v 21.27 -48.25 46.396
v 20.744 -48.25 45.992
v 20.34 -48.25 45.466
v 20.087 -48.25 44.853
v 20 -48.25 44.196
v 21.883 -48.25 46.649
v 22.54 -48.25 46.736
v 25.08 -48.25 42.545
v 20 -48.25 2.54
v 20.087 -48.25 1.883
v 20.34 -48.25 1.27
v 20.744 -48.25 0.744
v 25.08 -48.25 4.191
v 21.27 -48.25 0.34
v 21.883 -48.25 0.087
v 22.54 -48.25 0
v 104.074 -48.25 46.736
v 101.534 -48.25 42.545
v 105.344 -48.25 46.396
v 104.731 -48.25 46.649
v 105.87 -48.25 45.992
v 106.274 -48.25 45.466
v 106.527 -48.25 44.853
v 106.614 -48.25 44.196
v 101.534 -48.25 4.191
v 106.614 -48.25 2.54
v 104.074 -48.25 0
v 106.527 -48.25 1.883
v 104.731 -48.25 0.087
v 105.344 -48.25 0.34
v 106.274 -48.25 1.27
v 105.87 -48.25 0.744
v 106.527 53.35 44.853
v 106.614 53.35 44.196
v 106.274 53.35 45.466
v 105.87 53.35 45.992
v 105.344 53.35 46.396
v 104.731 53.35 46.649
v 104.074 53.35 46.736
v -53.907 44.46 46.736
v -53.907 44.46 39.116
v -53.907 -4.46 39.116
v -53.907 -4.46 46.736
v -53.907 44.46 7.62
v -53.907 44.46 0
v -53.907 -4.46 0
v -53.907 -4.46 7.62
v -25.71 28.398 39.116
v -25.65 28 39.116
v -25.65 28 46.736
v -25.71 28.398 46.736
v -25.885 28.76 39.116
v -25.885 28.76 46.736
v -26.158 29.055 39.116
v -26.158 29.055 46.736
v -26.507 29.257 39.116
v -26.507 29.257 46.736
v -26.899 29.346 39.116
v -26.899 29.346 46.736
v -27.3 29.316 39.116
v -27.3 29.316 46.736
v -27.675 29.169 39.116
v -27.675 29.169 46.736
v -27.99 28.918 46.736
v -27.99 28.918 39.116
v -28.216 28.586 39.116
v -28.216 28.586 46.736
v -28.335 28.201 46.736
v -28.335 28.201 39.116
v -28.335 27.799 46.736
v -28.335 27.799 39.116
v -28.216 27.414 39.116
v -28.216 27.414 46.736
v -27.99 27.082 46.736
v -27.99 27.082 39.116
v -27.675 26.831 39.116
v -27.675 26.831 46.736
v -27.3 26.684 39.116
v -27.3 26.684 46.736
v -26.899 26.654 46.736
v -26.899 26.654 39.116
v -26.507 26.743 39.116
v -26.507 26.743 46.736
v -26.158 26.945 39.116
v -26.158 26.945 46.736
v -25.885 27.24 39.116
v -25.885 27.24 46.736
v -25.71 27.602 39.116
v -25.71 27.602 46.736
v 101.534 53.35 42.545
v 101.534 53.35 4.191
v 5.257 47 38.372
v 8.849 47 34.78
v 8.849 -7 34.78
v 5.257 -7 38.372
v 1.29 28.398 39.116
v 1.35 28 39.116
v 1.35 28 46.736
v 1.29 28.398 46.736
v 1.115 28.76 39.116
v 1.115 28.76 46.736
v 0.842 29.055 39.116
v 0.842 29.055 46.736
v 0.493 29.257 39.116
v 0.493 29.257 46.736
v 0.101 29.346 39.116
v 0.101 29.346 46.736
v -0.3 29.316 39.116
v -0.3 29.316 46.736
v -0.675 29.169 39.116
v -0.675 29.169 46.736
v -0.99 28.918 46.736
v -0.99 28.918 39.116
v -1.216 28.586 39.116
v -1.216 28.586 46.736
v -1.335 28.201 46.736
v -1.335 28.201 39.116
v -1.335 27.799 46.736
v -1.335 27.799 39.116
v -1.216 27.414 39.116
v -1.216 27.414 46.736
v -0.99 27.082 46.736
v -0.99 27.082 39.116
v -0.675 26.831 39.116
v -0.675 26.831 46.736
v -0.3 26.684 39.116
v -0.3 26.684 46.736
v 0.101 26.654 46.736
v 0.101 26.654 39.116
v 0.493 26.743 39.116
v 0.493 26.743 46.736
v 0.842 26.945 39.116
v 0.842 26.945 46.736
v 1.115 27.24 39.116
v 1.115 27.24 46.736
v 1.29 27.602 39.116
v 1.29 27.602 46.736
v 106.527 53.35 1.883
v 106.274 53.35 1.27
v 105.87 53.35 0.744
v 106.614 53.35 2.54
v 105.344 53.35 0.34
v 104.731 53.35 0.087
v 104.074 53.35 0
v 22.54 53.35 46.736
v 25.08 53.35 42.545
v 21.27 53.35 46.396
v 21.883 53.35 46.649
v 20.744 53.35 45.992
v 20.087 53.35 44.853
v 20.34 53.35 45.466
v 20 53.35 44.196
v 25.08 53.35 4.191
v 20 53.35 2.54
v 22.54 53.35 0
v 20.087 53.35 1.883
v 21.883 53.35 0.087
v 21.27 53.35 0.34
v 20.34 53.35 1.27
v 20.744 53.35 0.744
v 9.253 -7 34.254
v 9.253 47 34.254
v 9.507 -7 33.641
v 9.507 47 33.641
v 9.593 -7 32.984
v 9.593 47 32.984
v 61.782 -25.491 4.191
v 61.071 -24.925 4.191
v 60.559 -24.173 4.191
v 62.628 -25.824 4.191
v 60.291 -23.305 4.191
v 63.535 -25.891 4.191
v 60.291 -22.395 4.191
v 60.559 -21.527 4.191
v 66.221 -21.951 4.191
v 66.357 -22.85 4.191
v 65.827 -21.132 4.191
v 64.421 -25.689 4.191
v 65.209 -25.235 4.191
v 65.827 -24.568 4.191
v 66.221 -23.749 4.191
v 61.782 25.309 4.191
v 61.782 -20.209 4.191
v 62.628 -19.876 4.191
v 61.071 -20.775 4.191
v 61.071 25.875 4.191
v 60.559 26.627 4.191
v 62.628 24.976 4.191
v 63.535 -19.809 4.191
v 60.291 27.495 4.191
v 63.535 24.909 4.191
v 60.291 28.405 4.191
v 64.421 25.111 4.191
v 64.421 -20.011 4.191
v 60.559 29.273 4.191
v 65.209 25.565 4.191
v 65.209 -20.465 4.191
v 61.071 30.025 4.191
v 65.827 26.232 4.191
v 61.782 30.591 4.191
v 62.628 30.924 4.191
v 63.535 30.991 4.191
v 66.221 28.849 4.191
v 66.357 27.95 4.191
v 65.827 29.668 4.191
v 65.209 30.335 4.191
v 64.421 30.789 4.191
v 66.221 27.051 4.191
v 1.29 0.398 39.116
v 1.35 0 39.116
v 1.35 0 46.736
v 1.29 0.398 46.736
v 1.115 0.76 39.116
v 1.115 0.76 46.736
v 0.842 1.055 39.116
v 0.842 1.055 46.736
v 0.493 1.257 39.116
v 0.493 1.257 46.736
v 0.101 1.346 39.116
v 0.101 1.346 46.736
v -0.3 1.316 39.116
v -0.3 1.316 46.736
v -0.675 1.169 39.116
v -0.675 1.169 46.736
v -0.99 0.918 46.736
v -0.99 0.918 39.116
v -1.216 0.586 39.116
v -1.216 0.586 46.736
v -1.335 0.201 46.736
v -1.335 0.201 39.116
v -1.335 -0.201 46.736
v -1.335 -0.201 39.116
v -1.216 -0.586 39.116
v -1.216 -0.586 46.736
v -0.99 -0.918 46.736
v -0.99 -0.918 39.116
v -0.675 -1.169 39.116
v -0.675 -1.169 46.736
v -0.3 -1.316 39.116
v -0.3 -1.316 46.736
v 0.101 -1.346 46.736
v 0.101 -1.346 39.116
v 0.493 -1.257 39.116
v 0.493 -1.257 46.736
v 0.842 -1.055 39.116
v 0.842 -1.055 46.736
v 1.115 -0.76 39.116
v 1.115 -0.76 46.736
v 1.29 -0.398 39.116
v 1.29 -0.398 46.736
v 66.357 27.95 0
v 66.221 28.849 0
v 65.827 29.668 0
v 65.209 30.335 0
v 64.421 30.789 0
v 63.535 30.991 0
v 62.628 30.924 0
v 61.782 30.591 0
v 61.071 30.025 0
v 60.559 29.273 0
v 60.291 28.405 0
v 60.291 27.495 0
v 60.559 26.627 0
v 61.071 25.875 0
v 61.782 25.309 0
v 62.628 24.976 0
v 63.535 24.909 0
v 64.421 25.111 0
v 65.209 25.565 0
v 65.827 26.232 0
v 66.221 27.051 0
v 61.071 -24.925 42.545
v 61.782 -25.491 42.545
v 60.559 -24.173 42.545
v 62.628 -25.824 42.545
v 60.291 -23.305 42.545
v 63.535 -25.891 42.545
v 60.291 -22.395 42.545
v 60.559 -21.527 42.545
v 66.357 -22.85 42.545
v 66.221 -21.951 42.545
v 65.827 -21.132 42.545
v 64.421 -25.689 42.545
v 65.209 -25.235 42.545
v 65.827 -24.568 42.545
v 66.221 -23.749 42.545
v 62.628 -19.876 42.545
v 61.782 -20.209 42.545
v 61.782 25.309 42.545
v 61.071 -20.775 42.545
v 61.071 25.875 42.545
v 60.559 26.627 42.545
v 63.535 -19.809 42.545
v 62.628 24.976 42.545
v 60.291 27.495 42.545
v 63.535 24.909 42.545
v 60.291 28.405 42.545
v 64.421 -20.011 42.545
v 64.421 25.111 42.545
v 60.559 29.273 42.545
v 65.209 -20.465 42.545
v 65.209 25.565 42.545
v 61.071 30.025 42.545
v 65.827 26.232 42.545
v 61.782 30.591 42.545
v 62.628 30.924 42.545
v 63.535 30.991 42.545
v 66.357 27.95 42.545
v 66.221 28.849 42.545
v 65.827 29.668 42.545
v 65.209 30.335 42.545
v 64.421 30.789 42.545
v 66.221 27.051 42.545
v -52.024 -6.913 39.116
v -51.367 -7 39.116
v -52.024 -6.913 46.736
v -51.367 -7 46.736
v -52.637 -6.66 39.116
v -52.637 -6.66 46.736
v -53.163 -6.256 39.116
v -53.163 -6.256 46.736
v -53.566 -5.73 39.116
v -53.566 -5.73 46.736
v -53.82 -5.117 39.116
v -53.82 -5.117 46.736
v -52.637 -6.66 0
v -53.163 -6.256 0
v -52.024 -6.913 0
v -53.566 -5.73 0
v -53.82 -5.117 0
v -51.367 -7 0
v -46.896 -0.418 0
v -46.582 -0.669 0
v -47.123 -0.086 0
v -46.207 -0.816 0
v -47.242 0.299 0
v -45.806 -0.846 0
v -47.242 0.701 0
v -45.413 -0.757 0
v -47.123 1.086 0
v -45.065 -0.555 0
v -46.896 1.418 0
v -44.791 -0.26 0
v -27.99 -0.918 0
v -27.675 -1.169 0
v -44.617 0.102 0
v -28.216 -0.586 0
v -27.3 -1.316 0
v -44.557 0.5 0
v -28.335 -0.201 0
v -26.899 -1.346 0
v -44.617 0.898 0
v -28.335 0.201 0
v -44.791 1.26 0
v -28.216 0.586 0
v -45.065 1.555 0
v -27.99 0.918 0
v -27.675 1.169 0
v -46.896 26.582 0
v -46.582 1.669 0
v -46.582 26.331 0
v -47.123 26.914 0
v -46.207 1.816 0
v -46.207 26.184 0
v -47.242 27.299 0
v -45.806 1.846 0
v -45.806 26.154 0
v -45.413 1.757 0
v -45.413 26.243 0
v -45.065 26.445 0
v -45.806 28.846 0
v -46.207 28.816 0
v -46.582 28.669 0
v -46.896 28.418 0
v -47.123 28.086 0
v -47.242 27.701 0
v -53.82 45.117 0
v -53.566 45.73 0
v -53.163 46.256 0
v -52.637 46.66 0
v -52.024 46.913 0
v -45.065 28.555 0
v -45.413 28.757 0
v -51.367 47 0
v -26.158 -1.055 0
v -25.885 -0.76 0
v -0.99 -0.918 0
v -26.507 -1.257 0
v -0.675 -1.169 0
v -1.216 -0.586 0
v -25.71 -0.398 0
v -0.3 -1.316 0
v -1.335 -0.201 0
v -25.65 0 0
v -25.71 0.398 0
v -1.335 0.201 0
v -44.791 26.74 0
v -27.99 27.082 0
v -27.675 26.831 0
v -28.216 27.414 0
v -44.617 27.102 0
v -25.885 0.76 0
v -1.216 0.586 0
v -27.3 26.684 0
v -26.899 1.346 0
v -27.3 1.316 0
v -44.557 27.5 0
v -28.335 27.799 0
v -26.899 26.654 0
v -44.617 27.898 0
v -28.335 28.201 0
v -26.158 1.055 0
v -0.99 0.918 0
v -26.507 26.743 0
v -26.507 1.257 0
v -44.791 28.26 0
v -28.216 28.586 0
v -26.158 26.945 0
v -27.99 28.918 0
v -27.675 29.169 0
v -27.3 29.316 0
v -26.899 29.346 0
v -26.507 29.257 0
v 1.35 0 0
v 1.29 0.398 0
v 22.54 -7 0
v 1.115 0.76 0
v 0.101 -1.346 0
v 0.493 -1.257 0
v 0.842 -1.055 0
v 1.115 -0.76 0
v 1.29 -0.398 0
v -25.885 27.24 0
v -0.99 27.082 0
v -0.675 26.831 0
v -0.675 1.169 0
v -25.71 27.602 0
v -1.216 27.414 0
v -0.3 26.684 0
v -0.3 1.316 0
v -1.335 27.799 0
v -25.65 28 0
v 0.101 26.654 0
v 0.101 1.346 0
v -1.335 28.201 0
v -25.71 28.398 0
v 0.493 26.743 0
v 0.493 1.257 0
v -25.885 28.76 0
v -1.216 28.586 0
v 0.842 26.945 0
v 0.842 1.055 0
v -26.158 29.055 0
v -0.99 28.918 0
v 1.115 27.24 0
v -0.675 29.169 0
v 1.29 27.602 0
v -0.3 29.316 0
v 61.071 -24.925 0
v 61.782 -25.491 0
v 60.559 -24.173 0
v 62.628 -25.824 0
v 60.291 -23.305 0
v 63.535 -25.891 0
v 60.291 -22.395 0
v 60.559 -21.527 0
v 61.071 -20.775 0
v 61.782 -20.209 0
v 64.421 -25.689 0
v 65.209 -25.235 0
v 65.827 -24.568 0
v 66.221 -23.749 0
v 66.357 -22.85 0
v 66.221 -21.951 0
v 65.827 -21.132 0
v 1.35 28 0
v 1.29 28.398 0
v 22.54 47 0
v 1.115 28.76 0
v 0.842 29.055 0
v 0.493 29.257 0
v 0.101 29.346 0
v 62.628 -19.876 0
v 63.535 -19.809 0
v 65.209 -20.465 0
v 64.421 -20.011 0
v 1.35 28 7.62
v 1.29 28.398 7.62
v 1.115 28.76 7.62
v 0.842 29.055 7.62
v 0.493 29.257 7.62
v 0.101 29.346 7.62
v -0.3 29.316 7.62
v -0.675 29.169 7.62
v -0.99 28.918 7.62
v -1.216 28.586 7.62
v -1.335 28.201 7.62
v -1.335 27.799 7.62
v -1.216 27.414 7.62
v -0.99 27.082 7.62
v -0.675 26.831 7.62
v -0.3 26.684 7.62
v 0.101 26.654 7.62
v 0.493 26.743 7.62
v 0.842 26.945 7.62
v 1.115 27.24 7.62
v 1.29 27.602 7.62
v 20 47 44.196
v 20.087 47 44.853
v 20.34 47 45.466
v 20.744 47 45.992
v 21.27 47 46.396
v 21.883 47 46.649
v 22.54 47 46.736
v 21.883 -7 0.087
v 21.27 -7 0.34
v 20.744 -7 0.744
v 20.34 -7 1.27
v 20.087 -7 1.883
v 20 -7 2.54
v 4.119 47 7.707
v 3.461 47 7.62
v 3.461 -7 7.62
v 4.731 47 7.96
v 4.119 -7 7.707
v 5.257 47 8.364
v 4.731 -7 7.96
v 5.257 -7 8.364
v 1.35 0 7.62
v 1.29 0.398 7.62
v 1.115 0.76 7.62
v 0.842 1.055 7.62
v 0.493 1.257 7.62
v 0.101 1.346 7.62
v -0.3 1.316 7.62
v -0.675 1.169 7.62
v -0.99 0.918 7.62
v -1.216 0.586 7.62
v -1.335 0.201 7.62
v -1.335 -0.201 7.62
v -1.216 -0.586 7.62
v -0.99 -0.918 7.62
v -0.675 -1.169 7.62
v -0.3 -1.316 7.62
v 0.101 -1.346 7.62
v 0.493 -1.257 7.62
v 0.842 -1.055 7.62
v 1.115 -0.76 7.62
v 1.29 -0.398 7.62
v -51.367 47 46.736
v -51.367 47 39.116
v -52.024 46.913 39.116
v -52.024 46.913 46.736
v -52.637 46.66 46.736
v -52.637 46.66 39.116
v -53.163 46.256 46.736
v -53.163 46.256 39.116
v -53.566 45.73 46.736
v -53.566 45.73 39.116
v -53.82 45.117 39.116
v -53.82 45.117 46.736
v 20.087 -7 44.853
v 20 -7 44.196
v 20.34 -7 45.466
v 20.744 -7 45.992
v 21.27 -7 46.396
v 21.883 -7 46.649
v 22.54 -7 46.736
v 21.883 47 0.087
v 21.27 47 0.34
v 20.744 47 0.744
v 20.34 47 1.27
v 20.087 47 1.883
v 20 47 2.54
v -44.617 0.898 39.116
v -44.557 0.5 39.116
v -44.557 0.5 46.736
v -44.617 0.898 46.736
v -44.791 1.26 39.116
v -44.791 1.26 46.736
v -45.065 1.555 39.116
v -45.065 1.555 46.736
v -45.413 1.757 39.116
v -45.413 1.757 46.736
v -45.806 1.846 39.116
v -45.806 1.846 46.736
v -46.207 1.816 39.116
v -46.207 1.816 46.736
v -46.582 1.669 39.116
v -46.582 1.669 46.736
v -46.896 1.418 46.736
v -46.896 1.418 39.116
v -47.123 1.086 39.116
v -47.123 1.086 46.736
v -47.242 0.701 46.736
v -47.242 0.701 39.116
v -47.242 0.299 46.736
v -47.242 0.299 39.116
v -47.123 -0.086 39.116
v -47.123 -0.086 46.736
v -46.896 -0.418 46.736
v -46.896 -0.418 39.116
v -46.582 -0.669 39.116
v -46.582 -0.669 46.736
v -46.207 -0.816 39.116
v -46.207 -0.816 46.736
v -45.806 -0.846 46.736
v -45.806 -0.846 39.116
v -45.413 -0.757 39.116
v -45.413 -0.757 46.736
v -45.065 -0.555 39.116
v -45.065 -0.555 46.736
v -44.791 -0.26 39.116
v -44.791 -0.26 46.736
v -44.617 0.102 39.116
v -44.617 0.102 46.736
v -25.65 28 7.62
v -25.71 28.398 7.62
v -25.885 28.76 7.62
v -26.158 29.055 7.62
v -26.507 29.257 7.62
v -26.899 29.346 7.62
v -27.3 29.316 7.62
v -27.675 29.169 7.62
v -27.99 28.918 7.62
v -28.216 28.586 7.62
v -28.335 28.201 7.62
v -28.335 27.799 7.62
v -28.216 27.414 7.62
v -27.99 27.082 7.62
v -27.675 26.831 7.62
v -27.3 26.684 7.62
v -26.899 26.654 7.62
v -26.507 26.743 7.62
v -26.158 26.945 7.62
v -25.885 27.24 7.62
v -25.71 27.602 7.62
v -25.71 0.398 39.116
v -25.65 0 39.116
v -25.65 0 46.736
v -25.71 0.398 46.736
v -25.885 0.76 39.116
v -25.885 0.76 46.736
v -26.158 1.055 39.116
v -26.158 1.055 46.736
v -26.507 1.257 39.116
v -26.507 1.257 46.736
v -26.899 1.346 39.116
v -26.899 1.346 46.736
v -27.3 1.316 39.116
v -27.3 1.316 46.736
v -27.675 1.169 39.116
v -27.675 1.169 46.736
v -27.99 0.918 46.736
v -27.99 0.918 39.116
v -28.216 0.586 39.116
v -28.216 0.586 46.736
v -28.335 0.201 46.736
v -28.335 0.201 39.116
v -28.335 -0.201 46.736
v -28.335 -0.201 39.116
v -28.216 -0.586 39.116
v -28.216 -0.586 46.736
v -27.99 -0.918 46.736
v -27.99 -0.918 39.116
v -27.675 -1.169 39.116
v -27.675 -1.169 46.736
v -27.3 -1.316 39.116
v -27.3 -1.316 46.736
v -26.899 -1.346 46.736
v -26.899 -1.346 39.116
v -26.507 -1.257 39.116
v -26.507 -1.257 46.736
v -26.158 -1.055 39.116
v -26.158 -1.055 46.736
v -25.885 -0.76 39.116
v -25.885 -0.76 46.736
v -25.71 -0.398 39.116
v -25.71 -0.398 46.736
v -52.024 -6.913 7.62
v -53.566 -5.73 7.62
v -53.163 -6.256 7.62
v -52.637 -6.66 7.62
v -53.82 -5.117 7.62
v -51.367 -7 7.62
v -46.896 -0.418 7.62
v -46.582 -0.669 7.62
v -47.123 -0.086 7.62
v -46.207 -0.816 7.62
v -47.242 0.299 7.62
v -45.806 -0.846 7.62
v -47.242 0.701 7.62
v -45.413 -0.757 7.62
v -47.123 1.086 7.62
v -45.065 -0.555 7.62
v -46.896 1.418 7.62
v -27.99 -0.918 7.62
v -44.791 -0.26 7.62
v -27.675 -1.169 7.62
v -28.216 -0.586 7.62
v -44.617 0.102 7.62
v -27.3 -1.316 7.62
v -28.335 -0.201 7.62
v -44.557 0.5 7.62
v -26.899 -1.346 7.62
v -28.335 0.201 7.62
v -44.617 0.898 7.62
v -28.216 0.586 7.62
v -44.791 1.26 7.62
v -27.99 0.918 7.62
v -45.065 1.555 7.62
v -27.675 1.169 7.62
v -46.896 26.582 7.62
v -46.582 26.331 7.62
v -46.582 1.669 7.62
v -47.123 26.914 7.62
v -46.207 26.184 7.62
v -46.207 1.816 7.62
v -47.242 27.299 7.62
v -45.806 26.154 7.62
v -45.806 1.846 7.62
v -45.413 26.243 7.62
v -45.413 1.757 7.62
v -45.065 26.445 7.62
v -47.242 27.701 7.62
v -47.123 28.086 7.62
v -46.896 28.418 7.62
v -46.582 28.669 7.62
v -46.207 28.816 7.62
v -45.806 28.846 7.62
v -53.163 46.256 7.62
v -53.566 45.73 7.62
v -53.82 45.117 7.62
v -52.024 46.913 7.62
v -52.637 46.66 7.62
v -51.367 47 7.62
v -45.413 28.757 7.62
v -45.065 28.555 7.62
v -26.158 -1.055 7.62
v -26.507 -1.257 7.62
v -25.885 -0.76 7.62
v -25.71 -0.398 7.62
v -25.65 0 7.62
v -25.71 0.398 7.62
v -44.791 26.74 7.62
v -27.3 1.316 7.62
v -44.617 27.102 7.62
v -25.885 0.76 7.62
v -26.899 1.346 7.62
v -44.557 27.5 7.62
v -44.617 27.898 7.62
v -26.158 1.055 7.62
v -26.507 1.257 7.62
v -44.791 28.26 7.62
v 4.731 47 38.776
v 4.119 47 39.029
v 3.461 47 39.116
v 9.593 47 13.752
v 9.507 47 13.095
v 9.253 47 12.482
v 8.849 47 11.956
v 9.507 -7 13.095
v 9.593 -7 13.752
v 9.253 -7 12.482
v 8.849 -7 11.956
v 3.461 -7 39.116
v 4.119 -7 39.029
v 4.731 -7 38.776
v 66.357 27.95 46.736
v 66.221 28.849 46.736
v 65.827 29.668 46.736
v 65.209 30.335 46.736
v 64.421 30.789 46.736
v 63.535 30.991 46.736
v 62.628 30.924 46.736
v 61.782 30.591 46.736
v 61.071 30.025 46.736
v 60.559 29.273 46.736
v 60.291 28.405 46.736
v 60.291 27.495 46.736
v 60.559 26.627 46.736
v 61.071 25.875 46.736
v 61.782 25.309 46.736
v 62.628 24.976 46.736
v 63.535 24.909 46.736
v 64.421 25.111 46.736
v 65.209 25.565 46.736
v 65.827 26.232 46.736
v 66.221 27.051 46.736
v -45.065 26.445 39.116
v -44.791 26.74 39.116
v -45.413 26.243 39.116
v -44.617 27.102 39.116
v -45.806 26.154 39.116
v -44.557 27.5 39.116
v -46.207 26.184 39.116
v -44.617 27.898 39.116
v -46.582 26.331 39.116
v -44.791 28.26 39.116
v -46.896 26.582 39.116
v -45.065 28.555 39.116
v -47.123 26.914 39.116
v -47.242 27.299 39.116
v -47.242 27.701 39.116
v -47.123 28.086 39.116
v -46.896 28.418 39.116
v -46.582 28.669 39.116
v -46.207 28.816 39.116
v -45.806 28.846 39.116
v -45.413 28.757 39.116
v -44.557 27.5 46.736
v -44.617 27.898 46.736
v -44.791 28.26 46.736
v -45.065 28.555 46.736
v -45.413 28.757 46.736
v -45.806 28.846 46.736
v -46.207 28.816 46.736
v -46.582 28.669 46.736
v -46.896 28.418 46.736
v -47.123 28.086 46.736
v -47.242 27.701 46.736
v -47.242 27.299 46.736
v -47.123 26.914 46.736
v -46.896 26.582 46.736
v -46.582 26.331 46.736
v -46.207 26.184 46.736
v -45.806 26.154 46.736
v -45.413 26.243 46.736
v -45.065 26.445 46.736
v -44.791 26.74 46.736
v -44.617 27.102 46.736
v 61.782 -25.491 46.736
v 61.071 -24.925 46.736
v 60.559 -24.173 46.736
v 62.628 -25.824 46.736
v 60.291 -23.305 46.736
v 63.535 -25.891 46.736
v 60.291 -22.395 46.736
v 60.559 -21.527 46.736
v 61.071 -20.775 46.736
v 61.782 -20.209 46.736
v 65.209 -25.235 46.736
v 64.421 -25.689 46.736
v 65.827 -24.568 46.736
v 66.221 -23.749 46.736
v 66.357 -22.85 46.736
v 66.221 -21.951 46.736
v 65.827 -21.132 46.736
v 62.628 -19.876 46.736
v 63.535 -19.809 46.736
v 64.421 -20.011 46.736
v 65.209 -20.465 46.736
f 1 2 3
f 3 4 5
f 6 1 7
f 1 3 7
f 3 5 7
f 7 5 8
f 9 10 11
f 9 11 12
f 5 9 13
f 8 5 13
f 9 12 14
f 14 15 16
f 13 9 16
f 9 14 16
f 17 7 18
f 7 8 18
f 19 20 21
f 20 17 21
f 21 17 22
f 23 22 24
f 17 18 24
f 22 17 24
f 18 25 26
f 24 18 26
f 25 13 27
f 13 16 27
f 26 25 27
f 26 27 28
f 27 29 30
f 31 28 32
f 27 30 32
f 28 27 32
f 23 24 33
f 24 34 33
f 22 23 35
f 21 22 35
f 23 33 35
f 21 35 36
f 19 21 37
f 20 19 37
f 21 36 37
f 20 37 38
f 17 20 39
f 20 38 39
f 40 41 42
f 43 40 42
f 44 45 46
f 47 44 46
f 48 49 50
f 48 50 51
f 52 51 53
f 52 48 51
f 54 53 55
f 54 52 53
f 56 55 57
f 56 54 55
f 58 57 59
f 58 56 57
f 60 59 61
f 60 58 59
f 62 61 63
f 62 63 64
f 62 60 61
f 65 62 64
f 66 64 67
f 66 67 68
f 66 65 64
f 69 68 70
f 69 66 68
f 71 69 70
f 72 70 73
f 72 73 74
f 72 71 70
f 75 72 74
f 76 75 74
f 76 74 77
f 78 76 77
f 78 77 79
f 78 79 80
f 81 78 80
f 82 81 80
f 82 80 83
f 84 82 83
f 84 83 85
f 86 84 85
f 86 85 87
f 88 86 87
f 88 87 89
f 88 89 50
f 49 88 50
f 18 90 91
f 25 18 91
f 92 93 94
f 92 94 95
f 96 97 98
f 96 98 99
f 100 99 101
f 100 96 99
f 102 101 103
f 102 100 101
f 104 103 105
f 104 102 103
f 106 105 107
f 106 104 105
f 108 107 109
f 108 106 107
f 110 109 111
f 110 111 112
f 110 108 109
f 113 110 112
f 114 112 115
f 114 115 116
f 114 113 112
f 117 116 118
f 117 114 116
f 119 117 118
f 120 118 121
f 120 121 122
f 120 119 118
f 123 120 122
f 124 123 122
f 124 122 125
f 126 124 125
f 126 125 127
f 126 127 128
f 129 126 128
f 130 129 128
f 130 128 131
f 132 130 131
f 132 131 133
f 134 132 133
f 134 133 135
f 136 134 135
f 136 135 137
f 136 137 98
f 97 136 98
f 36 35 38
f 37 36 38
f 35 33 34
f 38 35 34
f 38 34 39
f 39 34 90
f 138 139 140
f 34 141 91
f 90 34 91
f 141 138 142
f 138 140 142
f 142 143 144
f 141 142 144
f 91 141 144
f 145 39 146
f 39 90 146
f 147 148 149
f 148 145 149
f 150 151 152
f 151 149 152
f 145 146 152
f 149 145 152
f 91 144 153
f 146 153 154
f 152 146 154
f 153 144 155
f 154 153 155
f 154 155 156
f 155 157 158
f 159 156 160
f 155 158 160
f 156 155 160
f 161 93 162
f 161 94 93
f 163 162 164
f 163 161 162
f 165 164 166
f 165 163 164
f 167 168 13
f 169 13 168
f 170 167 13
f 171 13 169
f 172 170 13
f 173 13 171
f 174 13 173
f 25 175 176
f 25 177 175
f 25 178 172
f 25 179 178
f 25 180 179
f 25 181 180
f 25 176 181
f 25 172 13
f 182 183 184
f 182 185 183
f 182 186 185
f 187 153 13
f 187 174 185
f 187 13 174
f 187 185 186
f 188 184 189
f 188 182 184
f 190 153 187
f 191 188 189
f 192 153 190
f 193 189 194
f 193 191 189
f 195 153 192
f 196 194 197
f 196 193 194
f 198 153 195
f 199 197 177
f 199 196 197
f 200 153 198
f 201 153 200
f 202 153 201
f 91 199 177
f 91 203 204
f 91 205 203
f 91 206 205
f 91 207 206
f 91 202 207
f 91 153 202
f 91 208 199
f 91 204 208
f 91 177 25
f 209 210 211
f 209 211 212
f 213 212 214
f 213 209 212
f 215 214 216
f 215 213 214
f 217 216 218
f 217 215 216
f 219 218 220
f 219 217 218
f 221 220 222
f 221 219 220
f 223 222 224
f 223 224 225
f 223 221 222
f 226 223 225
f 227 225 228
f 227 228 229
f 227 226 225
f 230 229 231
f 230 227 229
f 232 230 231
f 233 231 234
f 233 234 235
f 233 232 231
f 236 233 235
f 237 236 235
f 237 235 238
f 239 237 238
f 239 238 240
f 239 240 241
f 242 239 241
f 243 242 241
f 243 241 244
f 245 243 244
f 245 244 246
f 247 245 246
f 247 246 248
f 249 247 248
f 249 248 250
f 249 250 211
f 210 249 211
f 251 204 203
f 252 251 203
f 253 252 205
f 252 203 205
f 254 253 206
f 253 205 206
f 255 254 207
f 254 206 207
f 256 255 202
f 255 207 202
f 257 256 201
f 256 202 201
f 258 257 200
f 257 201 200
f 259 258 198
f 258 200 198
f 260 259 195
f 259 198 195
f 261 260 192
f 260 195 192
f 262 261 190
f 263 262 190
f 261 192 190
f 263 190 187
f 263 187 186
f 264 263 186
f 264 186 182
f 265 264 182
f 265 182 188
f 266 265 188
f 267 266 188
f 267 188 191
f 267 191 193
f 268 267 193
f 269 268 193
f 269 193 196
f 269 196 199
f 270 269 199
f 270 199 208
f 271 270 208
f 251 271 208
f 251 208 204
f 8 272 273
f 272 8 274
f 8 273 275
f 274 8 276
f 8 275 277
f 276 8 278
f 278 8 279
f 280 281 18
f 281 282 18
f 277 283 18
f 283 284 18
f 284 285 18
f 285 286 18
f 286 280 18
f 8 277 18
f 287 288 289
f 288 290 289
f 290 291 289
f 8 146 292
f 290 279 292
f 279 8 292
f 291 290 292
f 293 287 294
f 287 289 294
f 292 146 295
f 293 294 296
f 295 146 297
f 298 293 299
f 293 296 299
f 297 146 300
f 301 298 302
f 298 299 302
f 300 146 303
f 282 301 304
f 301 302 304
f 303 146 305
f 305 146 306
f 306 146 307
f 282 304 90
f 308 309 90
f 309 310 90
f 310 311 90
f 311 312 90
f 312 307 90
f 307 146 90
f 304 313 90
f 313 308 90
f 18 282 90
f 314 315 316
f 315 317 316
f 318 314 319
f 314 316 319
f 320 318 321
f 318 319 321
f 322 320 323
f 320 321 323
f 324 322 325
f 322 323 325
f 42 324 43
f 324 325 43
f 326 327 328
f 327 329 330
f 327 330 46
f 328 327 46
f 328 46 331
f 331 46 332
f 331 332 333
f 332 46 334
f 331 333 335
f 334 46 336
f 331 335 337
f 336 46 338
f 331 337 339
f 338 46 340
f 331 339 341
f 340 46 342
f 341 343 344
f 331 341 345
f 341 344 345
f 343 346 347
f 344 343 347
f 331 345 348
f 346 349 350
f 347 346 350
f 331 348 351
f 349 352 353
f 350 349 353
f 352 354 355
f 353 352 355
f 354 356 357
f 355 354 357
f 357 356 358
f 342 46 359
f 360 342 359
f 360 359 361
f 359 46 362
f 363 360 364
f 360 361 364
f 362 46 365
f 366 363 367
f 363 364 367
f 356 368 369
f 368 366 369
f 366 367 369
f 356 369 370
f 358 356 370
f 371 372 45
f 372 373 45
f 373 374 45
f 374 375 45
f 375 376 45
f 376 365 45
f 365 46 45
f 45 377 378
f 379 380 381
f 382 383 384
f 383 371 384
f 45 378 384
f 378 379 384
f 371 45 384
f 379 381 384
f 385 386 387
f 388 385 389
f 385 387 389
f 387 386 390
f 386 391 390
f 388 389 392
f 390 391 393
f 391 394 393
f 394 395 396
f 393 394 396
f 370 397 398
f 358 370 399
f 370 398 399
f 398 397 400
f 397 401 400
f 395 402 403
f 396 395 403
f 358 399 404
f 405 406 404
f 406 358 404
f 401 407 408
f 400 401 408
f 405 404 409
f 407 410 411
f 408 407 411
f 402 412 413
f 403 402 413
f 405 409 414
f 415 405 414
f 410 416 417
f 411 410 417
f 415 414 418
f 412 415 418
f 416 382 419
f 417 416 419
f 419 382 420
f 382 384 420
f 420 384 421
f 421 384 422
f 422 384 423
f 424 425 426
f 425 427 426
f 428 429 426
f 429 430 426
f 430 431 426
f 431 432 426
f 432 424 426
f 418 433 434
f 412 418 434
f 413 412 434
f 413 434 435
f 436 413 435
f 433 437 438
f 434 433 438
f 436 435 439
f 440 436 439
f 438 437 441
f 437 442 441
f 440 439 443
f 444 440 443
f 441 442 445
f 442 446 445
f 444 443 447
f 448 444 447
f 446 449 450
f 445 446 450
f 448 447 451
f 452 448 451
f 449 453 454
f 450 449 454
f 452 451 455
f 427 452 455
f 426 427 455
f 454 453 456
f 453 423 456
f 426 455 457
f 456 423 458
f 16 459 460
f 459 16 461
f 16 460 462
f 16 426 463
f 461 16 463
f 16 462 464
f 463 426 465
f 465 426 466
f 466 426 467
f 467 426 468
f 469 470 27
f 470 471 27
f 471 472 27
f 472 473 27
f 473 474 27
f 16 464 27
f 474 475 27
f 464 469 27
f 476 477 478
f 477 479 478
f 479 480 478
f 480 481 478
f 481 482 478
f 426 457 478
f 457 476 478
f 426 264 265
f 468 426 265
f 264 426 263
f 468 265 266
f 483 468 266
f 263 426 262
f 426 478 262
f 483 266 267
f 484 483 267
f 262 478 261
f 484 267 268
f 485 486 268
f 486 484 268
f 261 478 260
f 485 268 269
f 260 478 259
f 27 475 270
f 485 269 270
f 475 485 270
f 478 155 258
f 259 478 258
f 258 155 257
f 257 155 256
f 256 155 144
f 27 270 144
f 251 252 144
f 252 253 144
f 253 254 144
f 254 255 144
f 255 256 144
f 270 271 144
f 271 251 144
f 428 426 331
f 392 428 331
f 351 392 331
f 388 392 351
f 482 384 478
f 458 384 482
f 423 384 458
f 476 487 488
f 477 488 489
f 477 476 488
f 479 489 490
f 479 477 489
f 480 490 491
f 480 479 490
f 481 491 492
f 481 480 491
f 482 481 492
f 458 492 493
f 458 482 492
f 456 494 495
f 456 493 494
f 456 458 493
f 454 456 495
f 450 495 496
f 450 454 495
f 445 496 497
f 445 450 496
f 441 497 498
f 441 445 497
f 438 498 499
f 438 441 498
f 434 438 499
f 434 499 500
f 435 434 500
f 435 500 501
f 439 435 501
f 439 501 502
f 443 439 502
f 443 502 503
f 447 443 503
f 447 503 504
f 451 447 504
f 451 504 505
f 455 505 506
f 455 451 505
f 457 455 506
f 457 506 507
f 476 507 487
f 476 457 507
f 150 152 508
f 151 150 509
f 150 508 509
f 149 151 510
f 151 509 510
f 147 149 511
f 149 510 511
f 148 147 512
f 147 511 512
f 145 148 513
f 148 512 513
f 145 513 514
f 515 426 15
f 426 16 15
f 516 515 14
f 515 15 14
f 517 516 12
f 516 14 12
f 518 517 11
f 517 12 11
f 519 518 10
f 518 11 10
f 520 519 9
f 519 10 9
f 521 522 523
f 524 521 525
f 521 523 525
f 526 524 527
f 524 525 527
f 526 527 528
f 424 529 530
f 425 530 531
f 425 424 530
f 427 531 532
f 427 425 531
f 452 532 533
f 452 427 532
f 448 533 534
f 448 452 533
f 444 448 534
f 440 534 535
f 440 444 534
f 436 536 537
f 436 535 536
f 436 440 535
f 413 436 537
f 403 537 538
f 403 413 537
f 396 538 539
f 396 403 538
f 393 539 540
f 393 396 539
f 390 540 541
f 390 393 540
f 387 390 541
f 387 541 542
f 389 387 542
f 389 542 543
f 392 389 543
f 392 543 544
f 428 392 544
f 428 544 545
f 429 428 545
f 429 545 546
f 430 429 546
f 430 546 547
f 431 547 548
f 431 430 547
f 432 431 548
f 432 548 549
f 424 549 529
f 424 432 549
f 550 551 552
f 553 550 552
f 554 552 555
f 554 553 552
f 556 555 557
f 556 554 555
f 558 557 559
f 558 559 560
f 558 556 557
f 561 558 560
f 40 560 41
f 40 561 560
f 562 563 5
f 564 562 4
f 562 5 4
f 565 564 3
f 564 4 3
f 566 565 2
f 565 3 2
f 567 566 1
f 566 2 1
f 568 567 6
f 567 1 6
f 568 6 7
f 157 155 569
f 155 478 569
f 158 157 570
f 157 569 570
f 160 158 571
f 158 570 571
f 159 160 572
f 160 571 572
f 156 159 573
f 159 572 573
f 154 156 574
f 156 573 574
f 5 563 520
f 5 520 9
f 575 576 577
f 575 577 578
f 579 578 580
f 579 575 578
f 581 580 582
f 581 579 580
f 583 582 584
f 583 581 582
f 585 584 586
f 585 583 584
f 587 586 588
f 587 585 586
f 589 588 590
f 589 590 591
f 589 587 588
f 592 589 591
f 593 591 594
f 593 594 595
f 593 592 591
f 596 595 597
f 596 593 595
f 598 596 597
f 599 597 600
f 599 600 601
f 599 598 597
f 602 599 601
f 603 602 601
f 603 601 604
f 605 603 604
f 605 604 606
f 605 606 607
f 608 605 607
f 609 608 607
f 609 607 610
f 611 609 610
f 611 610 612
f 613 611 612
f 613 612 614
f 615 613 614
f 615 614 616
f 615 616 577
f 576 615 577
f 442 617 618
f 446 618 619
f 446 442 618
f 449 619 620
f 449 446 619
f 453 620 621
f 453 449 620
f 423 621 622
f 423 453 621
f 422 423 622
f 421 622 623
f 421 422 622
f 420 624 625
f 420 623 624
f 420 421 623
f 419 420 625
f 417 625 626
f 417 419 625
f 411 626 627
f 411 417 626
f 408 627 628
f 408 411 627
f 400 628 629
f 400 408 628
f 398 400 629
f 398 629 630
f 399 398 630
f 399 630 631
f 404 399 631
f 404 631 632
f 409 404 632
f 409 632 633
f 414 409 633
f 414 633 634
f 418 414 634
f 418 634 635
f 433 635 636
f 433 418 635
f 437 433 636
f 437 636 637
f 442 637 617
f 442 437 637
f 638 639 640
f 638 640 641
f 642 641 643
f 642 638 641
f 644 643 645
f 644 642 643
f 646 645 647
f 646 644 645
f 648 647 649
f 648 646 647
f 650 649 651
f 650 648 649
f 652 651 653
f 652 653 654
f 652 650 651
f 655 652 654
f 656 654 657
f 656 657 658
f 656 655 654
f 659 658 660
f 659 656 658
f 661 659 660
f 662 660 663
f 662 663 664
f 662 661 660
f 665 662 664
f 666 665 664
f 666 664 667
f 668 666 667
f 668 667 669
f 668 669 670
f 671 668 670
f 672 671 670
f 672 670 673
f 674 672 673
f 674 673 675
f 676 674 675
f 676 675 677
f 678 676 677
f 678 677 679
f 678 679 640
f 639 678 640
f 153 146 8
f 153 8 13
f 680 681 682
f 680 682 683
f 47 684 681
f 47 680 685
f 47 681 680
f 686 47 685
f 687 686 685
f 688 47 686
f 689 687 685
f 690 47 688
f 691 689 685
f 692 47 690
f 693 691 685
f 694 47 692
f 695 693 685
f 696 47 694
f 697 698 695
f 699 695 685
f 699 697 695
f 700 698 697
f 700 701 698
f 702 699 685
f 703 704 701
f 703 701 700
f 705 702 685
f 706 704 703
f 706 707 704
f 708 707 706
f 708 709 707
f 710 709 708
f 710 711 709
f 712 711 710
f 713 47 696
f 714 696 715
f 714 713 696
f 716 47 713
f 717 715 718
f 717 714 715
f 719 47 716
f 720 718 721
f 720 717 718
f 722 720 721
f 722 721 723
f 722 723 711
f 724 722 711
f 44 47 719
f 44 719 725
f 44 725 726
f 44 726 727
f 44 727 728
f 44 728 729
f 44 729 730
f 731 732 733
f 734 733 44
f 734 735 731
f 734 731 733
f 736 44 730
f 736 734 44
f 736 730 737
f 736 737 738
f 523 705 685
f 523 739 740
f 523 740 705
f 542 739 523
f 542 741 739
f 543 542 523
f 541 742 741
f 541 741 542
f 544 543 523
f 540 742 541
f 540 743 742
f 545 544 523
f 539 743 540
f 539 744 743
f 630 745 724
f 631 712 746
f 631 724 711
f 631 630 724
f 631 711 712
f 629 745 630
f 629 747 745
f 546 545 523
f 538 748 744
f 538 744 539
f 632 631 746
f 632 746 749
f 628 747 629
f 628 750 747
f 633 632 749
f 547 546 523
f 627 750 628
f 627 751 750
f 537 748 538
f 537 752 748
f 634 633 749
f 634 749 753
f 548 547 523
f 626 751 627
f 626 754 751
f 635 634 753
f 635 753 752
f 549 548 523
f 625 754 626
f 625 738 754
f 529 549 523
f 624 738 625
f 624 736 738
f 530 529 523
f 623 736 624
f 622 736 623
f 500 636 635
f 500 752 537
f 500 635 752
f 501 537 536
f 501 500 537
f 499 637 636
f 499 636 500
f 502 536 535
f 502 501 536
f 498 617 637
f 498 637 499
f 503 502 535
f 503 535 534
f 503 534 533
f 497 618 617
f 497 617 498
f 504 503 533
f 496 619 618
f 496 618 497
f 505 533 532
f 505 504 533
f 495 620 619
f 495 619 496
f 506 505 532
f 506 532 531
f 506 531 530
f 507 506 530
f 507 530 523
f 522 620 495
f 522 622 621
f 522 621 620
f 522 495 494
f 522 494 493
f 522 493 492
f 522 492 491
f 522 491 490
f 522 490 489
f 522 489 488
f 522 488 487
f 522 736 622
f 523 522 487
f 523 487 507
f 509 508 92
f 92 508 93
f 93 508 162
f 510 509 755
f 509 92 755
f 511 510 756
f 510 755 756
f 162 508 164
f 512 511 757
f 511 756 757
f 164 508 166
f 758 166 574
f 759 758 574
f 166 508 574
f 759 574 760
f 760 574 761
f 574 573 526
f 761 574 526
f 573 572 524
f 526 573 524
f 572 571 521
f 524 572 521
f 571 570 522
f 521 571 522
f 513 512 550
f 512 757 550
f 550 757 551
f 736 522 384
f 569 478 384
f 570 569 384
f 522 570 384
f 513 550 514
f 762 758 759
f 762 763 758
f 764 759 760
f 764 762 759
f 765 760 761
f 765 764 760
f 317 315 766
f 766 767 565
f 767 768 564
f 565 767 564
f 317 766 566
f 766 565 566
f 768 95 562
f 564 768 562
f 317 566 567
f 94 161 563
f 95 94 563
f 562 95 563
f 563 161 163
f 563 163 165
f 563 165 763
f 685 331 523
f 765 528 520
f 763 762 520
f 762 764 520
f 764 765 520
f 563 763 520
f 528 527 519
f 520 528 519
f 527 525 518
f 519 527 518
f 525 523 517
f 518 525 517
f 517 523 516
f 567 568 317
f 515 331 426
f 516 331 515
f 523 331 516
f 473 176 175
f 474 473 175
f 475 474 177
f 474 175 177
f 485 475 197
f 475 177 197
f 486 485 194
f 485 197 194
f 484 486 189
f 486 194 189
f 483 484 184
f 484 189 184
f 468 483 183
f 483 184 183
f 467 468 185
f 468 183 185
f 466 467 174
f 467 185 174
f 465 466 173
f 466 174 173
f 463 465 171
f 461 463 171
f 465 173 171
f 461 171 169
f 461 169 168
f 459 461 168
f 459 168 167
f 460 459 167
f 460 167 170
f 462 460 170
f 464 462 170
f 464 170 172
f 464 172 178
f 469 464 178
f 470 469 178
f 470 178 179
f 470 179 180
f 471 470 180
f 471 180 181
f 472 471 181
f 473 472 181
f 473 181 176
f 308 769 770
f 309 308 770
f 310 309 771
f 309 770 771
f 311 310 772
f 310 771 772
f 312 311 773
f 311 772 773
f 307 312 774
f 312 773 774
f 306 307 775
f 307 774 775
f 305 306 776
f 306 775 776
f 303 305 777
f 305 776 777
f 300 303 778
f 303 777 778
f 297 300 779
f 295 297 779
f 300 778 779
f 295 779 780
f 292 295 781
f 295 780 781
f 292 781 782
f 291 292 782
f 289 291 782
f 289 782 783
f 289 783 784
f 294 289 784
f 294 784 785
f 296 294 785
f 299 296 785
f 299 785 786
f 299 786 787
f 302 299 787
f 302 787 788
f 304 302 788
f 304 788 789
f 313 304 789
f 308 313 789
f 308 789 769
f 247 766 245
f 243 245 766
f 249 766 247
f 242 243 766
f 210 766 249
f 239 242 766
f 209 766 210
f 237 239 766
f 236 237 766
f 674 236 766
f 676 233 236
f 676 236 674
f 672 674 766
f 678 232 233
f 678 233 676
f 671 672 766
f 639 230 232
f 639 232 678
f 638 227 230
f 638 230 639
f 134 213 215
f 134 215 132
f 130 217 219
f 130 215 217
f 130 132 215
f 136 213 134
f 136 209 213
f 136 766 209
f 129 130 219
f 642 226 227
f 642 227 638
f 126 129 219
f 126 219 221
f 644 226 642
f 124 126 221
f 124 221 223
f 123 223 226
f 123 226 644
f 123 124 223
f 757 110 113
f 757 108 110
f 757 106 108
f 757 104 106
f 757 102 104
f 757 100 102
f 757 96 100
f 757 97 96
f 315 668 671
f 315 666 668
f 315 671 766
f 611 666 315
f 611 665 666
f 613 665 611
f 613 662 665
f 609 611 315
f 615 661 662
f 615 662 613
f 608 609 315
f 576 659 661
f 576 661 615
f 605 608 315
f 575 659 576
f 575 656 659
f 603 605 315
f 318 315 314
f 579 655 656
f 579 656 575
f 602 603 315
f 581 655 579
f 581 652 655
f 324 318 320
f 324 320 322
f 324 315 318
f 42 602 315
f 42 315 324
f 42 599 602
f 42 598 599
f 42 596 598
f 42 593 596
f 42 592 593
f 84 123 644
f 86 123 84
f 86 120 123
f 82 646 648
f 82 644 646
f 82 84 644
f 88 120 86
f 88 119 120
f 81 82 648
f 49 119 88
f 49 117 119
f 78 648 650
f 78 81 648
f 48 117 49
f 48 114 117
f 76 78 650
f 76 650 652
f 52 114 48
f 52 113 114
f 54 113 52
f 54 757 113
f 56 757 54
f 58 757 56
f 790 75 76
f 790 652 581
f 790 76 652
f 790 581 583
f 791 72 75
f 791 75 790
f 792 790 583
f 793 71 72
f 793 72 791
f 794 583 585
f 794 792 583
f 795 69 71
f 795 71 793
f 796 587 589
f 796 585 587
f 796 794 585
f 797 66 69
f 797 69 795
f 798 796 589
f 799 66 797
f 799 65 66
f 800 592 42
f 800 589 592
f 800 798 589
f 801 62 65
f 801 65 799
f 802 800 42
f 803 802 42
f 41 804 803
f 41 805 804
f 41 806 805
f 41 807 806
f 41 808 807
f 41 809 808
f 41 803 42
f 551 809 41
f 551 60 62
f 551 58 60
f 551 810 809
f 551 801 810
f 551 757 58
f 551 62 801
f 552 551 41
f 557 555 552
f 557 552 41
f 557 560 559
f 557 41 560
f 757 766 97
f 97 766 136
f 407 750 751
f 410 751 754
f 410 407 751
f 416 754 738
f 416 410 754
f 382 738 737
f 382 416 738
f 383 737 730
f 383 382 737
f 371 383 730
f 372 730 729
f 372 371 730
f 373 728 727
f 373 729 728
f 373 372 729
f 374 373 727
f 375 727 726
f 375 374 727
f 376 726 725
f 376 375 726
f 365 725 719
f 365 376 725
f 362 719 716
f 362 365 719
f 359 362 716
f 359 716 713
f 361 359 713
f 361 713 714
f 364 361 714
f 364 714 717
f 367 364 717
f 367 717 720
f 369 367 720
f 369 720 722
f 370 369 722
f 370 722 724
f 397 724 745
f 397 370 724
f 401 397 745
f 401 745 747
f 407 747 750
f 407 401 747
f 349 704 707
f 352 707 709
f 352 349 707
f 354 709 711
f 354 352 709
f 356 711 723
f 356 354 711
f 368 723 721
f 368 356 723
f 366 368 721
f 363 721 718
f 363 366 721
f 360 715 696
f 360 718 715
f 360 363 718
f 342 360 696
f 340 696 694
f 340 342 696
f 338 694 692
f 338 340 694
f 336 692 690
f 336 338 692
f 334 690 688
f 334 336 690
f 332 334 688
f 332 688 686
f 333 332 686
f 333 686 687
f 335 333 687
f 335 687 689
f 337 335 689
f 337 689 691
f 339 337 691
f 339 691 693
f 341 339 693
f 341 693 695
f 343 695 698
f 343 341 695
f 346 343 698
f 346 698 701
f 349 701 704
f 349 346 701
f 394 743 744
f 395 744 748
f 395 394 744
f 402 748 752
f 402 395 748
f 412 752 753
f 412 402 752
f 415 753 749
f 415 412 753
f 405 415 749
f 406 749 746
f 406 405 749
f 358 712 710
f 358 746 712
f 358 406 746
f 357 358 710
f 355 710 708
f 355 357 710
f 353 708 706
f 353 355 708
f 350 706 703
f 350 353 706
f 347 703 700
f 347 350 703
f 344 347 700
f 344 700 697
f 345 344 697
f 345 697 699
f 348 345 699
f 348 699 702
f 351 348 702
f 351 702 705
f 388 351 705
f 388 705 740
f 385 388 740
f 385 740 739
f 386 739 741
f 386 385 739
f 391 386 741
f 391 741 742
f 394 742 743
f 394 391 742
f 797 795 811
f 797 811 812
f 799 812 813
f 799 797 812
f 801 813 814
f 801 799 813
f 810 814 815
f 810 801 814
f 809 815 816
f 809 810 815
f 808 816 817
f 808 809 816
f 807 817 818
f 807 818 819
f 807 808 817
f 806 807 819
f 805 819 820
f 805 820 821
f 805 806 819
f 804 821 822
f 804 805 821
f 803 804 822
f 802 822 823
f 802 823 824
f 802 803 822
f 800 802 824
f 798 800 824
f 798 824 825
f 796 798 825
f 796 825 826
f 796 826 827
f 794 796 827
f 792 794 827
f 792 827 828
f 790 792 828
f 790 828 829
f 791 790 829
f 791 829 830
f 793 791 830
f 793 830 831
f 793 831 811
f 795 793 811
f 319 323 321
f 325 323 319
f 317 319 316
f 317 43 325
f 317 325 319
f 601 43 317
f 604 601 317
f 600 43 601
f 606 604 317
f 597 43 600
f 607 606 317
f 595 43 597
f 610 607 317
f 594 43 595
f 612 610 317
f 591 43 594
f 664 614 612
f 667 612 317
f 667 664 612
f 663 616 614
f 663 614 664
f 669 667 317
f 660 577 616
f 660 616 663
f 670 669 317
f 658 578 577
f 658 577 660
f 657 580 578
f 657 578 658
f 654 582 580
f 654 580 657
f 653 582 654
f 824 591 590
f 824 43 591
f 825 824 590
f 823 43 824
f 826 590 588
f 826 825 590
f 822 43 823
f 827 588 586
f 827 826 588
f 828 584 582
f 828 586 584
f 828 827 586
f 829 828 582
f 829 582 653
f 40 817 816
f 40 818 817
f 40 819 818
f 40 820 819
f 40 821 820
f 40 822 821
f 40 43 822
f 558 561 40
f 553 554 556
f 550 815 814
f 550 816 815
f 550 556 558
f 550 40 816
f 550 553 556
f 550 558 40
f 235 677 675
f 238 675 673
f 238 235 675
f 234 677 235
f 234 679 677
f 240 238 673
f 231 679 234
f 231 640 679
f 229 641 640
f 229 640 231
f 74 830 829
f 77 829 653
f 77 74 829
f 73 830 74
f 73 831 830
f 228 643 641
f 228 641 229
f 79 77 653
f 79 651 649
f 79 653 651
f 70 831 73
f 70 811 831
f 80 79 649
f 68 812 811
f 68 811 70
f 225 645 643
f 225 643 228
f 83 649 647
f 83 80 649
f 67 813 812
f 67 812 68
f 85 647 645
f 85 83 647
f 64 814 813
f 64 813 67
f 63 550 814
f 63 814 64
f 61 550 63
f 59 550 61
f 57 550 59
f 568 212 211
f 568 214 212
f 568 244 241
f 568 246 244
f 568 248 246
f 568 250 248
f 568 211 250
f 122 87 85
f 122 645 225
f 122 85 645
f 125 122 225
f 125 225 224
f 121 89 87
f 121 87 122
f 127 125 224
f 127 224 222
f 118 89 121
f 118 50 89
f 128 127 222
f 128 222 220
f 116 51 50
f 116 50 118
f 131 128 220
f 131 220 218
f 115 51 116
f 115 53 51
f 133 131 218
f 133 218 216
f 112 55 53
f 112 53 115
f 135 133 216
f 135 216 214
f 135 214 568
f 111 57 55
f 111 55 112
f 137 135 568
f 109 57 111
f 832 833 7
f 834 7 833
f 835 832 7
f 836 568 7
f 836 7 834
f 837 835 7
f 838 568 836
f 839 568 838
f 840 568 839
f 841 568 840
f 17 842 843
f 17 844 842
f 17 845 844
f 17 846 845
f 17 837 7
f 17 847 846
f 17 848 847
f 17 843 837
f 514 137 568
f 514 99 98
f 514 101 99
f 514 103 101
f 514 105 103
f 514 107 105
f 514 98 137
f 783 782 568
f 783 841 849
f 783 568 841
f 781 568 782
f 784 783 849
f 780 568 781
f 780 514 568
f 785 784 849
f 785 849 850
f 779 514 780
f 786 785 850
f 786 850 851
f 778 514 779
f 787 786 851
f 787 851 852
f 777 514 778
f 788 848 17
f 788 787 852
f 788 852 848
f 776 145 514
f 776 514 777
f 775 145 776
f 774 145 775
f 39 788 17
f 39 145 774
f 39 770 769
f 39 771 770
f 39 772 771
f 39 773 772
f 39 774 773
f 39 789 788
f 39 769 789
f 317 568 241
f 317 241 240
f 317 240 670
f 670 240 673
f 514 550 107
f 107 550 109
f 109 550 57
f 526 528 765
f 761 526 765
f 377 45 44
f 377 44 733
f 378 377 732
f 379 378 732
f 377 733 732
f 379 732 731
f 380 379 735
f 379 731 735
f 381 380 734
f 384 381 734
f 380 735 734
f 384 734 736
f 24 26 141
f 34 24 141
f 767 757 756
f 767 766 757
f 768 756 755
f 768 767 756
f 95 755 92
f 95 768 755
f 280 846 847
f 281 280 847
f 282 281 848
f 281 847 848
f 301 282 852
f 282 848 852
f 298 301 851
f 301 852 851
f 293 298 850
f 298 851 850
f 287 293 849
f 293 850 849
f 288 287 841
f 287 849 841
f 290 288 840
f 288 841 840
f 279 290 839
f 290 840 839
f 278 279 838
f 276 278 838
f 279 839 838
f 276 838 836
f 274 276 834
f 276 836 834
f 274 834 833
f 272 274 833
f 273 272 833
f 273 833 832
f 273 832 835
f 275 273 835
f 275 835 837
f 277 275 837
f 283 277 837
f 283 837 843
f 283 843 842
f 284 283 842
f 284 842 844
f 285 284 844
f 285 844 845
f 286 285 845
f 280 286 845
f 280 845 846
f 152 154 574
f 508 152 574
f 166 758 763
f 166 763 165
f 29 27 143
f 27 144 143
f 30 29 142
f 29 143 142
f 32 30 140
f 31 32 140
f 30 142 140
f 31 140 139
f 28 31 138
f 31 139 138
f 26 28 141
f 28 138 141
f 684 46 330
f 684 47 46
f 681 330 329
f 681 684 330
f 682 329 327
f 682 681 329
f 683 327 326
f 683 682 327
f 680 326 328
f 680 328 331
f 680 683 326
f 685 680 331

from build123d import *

# Parameters (mm, degrees)
SKETCH1_R           = 1.35
BOSS_EXTRUDE1_DEPTH = 46.736
SKETCH2_W           = 76.454
SKETCH2_H           = 38.354
CUT_EXTRUDE1_DEPTH  = 137.16
FILLET1_R           = 2.54
SKETCH3_R           = 3.05
CUT_EXTRUDE2_DEPTH  = 66.294


with BuildPart() as part:
    # Sketch1 → Boss-Extrude1 (new body)
    with BuildSketch(Plane.XY):
        Polygon((-53.90661, 47), (-53.90661, -7), (20, -7), (20, -48.25), (106.614, -48.25), (106.614, 53.35), (20, 53.35), (20, 47), align=None)
        Circle(SKETCH1_R, mode=Mode.SUBTRACT)
        with Locations((-27, 0)):
            Circle(SKETCH1_R, mode=Mode.SUBTRACT)
        with Locations((-45.90661, 0.5)):
            Circle(SKETCH1_R, mode=Mode.SUBTRACT)
        with Locations((-45.90661, 27.5)):
            Circle(SKETCH1_R, mode=Mode.SUBTRACT)
        with Locations((-27, 28)):
            Circle(SKETCH1_R, mode=Mode.SUBTRACT)
        with Locations((0, 28)):
            Circle(SKETCH1_R, mode=Mode.SUBTRACT)
    extrude(amount=BOSS_EXTRUDE1_DEPTH)

    # Sketch2 → Cut-Extrude1 (cut)
    with BuildSketch(Plane(origin=(0, 53.35, 0), x_dir=(1, 0, 0), z_dir=(0, 1, 0))):
        Polygon((-53.90661, -7.62), (4.51339, -7.62), (9.59339, -12.7), (9.59339, -34.036), (4.51339, -39.116), (-53.90661, -39.116), align=None)
        with Locations((63.307, -23.368)):
            Rectangle(SKETCH2_W, SKETCH2_H)
    extrude(amount=-CUT_EXTRUDE1_DEPTH, mode=Mode.SUBTRACT)

    # Fillet1
    fillet1_edges = [part.edges().sort_by_distance(p)[0] for p in [
        (20, 50.175, 0),
        (-53.90661, -7, 42.926),
        (-53.90661, 47, 42.926),
        (20, -27.625, 46.736),
        (106.614, 2.55, 46.736),
        (-53.90661, -7, 3.81),
        (-53.90661, 47, 3.81),
        (4.51339, 20, 7.62),
        (9.59339, 20, 12.7),
        (9.59339, 20, 34.036),
        (4.51339, 20, 39.116),
        (106.614, 2.55, 0),
        (20, 50.175, 46.736),
        (20, -27.625, 0),
    ]]
    fillet(fillet1_edges, radius=FILLET1_R)

    # Sketch3 → Cut-Extrude2 (cut)
    with BuildSketch(Plane.XY.offset(46.736)):
        with Locations((63.307, 27.95)):
            Circle(SKETCH3_R)
        with Locations((63.307, -22.85)):
            Circle(SKETCH3_R)
    extrude(amount=-CUT_EXTRUDE2_DEPTH, mode=Mode.SUBTRACT)


solid = part.part
